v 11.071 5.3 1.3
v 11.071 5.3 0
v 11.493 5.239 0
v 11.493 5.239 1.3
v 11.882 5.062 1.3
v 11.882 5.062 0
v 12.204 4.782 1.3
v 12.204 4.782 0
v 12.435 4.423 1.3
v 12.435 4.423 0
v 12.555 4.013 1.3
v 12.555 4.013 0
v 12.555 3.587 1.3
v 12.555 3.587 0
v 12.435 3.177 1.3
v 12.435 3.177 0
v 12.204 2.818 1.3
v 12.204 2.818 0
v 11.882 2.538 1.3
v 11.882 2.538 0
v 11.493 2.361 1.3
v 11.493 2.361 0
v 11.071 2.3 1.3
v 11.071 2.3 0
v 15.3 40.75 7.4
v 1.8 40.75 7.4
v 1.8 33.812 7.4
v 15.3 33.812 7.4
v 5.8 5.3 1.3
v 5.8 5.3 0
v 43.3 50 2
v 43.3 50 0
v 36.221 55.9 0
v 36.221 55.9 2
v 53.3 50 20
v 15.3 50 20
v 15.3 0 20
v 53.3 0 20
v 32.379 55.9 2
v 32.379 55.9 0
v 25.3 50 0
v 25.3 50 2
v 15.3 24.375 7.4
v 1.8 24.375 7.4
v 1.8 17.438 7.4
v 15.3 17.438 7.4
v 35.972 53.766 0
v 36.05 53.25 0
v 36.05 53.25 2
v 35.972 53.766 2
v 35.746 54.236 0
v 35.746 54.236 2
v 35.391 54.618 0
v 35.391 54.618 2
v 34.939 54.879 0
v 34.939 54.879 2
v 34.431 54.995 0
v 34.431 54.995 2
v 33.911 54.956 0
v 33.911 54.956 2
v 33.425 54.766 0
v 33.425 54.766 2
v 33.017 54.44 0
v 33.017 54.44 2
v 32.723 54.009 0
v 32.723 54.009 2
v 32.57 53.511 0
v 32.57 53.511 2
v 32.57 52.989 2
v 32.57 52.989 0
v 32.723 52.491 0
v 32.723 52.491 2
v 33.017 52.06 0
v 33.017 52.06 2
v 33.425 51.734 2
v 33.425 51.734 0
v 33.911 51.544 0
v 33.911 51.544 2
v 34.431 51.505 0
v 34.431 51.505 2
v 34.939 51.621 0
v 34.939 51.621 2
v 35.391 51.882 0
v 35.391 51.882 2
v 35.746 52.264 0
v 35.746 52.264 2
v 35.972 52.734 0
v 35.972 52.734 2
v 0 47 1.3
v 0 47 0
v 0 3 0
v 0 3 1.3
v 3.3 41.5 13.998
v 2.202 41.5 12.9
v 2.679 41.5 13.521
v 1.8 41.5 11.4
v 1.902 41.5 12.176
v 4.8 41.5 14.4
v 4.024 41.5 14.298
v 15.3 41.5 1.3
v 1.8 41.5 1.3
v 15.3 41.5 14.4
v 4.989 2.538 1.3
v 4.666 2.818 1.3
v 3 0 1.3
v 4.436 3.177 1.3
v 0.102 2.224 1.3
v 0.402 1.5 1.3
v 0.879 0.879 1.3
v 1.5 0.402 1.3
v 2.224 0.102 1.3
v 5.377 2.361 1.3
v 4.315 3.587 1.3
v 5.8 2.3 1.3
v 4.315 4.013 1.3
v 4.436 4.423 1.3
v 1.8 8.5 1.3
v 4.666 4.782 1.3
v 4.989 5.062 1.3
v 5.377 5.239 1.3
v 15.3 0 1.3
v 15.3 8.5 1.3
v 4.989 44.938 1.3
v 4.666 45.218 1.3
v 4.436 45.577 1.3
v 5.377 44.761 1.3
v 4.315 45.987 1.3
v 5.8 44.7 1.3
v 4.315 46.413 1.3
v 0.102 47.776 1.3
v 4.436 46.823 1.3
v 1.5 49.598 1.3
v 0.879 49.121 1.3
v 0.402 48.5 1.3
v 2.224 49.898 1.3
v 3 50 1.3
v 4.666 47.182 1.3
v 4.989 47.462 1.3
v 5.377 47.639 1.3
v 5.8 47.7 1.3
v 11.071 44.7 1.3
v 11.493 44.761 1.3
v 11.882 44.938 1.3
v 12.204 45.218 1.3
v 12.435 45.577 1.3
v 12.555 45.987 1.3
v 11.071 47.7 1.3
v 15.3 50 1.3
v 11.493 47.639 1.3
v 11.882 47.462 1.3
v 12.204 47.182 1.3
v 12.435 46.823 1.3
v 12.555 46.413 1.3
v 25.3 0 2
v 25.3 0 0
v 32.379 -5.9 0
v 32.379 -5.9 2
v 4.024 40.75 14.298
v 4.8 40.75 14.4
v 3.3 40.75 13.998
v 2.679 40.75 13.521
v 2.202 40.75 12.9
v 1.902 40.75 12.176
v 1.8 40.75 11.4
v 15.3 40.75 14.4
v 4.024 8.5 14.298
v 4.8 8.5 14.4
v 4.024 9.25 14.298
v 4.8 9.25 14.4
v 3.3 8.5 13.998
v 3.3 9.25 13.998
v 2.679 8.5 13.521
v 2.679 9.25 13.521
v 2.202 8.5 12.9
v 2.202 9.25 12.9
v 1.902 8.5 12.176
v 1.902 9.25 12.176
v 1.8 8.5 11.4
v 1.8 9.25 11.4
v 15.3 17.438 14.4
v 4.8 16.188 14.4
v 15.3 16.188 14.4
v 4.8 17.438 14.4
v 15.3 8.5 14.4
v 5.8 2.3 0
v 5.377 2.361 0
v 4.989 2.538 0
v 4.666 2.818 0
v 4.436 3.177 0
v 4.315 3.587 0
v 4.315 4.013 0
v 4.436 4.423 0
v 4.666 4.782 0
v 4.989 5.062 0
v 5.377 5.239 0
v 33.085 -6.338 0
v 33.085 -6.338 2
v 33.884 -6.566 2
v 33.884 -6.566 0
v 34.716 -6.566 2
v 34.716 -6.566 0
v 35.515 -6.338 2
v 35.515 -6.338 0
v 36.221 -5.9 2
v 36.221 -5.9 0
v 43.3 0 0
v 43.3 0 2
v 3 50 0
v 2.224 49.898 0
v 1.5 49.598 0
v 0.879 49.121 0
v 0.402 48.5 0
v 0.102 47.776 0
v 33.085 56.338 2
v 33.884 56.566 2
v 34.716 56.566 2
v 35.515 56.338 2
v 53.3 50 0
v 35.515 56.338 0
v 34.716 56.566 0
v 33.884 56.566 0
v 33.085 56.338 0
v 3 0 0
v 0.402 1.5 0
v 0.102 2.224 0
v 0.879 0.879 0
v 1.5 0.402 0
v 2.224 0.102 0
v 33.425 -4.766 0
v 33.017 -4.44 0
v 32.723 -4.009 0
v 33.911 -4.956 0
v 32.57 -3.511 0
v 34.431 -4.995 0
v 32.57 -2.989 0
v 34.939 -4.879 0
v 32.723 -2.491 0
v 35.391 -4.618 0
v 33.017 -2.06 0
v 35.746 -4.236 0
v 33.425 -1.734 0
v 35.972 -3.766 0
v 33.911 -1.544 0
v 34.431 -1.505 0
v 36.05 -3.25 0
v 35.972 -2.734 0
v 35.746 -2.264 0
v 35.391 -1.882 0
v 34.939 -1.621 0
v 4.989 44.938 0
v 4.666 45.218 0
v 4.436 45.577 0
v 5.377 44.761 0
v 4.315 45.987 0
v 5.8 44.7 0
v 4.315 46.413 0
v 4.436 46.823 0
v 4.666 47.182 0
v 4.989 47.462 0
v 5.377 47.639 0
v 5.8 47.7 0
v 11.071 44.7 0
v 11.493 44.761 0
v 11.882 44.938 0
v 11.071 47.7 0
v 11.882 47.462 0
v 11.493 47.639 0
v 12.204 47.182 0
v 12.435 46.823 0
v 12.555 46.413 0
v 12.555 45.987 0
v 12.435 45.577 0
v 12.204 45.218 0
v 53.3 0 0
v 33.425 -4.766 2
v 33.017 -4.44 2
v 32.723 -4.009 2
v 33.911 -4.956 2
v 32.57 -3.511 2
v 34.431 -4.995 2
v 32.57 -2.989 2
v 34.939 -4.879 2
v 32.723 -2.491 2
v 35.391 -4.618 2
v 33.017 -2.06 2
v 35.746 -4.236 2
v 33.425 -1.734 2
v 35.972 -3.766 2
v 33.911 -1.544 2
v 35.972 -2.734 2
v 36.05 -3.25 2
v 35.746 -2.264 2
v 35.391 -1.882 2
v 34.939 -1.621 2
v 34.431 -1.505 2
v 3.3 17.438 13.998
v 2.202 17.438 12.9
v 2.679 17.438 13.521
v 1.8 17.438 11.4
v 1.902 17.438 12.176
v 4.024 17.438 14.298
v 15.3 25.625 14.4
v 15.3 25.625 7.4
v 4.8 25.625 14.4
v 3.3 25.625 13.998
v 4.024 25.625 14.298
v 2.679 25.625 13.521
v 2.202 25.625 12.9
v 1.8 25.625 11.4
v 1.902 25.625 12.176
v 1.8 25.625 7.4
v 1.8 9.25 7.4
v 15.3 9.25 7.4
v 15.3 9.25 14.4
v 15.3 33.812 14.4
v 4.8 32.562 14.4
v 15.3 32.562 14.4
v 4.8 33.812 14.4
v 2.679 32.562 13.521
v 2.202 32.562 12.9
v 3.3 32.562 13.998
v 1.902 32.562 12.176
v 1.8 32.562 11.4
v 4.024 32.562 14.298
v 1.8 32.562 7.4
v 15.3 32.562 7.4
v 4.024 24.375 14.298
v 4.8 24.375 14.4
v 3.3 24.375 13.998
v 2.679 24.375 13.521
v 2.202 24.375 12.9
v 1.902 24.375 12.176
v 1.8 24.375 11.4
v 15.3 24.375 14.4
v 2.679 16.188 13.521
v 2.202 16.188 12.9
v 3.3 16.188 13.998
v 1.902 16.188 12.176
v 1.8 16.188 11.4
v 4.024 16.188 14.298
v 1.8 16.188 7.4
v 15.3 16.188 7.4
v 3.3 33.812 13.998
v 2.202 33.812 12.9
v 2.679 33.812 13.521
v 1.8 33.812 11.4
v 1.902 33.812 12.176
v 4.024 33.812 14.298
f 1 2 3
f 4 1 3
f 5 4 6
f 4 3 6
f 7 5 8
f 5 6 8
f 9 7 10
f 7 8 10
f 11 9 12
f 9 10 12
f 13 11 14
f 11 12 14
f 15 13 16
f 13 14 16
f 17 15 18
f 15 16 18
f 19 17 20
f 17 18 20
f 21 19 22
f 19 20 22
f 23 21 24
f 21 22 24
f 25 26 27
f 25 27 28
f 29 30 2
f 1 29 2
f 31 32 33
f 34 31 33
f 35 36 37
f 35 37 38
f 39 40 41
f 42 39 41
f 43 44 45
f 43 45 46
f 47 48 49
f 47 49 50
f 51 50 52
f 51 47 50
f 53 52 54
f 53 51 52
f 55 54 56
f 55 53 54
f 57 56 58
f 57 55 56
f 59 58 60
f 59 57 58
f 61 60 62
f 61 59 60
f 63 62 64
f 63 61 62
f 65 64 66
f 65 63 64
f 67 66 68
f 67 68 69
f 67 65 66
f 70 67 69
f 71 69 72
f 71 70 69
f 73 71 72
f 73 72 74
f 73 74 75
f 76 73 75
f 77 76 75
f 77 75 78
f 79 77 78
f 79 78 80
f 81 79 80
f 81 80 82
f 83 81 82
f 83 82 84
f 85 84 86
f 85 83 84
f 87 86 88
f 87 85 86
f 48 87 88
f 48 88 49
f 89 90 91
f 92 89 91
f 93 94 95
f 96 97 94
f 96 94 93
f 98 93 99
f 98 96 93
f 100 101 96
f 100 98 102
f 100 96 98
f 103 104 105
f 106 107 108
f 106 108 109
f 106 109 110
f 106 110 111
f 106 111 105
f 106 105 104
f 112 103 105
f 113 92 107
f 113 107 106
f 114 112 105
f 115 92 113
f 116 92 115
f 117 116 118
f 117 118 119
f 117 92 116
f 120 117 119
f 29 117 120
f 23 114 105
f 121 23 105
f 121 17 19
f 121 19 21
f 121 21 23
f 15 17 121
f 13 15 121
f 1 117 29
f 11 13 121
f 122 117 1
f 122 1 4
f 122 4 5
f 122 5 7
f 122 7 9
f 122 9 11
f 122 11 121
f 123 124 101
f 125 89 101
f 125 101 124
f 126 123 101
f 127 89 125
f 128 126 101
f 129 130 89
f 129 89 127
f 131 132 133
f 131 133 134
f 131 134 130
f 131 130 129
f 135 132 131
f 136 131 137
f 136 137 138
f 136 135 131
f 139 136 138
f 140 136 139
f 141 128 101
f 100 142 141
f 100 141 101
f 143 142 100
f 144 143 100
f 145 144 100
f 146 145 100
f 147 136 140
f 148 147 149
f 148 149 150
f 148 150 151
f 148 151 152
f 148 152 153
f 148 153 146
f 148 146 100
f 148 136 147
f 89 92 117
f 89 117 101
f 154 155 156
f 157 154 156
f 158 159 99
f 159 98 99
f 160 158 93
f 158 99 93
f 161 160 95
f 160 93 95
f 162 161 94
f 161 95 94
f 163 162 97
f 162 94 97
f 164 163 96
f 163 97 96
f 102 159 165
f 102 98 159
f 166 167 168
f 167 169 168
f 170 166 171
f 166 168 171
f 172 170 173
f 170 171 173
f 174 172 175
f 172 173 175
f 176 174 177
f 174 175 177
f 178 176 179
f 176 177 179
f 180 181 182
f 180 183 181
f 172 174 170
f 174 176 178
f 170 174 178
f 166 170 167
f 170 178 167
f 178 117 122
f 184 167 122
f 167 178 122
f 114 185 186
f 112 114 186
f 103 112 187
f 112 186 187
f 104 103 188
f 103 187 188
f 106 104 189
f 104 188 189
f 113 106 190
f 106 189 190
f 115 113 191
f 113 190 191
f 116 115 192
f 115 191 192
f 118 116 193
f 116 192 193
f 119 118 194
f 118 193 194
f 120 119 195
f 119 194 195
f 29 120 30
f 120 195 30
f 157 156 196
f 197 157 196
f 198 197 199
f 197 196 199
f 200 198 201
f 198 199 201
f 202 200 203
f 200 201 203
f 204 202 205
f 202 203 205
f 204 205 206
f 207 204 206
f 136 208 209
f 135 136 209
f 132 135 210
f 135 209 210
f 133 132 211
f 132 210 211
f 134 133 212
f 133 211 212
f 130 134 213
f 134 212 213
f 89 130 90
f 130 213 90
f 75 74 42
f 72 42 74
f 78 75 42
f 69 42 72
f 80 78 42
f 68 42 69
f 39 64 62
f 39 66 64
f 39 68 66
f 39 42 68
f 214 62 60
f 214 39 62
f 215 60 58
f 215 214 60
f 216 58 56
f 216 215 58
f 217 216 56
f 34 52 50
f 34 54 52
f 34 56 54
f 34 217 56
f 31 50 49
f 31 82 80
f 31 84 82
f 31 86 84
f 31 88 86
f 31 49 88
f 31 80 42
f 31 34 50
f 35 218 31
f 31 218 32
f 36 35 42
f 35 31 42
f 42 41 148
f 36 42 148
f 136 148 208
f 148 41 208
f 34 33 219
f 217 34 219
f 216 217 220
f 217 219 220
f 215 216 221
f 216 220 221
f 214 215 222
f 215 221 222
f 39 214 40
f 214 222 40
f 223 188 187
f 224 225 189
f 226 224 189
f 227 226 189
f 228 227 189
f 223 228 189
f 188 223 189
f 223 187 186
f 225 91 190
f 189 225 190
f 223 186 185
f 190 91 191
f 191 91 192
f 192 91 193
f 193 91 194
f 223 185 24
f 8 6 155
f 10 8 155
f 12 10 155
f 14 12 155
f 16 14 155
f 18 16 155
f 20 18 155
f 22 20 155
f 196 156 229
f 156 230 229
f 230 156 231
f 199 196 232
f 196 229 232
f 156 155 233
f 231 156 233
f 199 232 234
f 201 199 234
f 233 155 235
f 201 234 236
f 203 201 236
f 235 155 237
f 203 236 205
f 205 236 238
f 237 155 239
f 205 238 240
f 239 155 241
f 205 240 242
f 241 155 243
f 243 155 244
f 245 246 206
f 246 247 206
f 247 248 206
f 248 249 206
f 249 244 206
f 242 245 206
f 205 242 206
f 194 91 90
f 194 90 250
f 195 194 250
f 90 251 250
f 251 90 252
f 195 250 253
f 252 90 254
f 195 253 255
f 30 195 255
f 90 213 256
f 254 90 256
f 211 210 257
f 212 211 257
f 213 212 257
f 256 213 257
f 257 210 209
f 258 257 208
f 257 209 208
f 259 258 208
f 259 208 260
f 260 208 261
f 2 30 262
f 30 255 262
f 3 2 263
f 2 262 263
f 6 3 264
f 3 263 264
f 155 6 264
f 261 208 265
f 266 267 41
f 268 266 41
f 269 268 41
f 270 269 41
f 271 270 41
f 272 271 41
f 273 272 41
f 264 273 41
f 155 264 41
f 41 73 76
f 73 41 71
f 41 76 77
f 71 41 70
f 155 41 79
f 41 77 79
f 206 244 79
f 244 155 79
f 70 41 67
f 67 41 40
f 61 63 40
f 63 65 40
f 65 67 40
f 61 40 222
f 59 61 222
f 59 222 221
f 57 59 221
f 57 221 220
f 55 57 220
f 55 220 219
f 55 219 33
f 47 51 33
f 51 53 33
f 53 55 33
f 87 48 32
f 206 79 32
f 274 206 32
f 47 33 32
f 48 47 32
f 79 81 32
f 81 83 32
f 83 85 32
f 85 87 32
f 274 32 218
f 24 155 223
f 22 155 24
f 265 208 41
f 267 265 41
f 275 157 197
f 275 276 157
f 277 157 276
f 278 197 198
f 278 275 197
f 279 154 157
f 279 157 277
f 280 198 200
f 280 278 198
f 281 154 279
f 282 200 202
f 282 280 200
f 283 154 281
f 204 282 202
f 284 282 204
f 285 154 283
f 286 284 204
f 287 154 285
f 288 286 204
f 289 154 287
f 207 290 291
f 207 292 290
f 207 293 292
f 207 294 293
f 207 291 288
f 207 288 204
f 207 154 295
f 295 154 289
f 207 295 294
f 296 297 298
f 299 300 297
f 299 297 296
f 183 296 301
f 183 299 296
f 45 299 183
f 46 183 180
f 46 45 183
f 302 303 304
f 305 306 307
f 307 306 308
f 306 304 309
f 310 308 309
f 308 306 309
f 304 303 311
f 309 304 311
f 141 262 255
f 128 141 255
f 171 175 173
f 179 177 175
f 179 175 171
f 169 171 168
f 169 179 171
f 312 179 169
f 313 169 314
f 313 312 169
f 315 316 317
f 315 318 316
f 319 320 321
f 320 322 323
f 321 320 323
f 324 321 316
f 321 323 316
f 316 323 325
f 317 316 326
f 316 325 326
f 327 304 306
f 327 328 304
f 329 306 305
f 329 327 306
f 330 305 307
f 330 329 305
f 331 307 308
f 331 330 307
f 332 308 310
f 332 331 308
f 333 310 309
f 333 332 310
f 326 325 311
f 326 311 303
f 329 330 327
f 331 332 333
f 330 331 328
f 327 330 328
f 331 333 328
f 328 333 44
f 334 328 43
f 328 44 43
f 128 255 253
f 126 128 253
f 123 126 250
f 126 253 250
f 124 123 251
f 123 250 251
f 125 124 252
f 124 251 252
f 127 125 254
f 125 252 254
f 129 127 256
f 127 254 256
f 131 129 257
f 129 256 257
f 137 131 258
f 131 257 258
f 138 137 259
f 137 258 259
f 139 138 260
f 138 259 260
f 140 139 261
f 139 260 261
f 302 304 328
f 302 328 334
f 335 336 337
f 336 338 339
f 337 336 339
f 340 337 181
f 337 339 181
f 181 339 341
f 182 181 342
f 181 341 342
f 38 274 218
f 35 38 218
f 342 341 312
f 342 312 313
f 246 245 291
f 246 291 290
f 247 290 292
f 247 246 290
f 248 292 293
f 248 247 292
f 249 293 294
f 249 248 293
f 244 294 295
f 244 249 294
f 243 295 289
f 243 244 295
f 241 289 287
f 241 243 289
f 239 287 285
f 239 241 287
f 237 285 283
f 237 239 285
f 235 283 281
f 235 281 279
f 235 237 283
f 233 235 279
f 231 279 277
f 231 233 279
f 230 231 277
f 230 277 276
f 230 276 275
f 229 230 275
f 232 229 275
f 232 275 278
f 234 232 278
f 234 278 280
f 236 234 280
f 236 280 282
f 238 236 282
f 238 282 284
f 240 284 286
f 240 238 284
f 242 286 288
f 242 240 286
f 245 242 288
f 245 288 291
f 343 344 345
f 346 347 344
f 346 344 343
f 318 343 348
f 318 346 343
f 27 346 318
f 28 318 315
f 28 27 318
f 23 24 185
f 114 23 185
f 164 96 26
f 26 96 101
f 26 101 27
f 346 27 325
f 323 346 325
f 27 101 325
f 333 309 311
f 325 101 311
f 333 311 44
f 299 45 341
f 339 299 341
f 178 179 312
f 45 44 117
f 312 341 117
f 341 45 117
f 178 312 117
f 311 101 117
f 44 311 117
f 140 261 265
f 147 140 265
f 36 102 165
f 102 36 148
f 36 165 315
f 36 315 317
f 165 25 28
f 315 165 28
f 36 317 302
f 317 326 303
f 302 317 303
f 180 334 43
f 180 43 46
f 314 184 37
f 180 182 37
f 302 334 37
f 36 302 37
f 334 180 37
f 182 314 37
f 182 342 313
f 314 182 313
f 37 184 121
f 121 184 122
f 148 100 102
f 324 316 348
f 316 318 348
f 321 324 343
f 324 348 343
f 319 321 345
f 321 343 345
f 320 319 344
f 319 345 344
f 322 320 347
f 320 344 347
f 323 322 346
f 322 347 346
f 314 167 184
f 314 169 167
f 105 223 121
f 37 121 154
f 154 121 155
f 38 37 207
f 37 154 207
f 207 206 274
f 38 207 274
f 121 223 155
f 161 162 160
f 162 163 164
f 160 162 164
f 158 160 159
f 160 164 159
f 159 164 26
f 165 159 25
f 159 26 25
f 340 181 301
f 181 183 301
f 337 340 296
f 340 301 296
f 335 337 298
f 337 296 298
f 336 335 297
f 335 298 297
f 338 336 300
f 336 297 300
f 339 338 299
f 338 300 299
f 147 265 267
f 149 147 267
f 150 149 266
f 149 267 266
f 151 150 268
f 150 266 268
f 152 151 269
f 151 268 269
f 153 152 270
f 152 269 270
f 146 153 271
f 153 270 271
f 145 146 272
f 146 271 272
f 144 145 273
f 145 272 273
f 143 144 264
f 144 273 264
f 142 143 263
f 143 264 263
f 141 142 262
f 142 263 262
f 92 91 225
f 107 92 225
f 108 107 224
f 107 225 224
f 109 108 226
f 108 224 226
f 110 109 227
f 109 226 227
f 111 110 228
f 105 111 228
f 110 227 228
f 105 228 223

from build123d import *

# Parameters (mm, degrees)
F1_DEPTH = 20
F0_R     = 1.75
F2_DEPTH = 2
F3_DEPTH = 1.3
F4_W     = 13.5
F4_H     = 6.9375
F4_H_2   = 1.25
F4_H_3   = 0.75
F5_DEPTH = 6.1
F6_DEPTH = 13.1
F7_R     = 3


with BuildPart() as f1:
    # F0 (on Top) → F1 (new body)
    with BuildSketch(Plane.XY):
        Polygon((15.3, 50), (15.3, 0), (25.3, 0), (43.3, 0), (53.3, 0), (53.3, 50), (43.3, 50), (25.3, 50), align=None)
    extrude(amount=F1_DEPTH)

    # F0 (on Top) → F2 (join)
    with BuildSketch(Plane.XY):
        with BuildLine():
            Line((43.3, 0), (25.3, 0))
            Line((25.3, 0), (32.379446801, -5.8995390008))
            ThreePointArc((32.379446801, -5.8995390008), (34.3, -6.594875162), (36.220553199, -5.8995390008))
            Line((36.220553199, -5.8995390008), (43.3, 0))
        make_face()
        with Locations((34.3, -3.25)):
            Circle(F0_R, mode=Mode.SUBTRACT)
        with BuildLine():
            Line((32.379446801, 55.8995390008), (25.3, 50))
            Line((25.3, 50), (43.3, 50))
            Line((43.3, 50), (36.220553199, 55.8995390008))
            ThreePointArc((36.220553199, 55.8995390008), (34.3, 56.594875162), (32.379446801, 55.8995390008))
        make_face()
        with Locations((34.3, 53.25)):
            Circle(F0_R, mode=Mode.SUBTRACT)
    extrude(amount=F2_DEPTH)

    # F0 (on Top) → F3 (join)
    with BuildSketch(Plane.XY):
        with BuildLine():
            ThreePointArc((0, 3), (0.8786796564, 0.8786796564), (3, 0))
            Line((3, 0), (15.3, 0))
            Line((15.3, 0), (15.3, 50))
            Line((15.3, 50), (3, 50))
            ThreePointArc((3, 50), (0.8786796564, 49.1213203436), (0, 47))
            Line((0, 47), (0, 3))
        make_face()
        with BuildLine():
            Line((11.0706789419, 2.3), (5.8, 2.3))
            ThreePointArc((5.8, 2.3), (4.3, 3.8), (5.8, 5.3))
            Line((5.8, 5.3), (11.0706789419, 5.3))
            ThreePointArc((11.0706789419, 5.3), (12.5706789419, 3.8), (11.0706789419, 2.3))
        make_face(mode=Mode.SUBTRACT)
        with BuildLine():
            Line((11.0706789419, 44.7), (5.8, 44.7))
            ThreePointArc((5.8, 44.7), (4.3, 46.2), (5.8, 47.7))
            Line((5.8, 47.7), (11.0706789419, 47.7))
            ThreePointArc((11.0706789419, 47.7), (12.5706789419, 46.2), (11.0706789419, 44.7))
        make_face(mode=Mode.SUBTRACT)
    extrude(amount=F3_DEPTH)

    # F4 (on face) → F5 (join)
    with BuildSketch(Plane.XY.offset(1.3)):
        with Locations((8.55, 37.28125)):
            Rectangle(F4_W, F4_H)
        with Locations((8.55, 33.1875)):
            Rectangle(F4_W, F4_H_2)
        with Locations((8.55, 29.09375)):
            Rectangle(F4_W, F4_H)
        Polygon((15.3, 25), (15.3, 25.625), (1.8, 25.625), (1.8, 25), (1.8, 24.375), (15.3, 24.375), align=None)
        with Locations((8.55, 20.90625)):
            Rectangle(F4_W, F4_H)
        with Locations((8.55, 16.8125)):
            Rectangle(F4_W, F4_H_2)
        with Locations((8.55, 12.71875)):
            Rectangle(F4_W, F4_H)
        with Locations((8.55, 8.875)):
            Rectangle(F4_W, F4_H_3)
        with Locations((8.55, 41.125)):
            Rectangle(F4_W, F4_H_3)
    extrude(amount=F5_DEPTH)

    # F4 (on face) → F6 (join)
    with BuildSketch(Plane.XY.offset(1.3)):
        with Locations((8.55, 41.125)):
            Rectangle(F4_W, F4_H_3)
        with Locations((8.55, 8.875)):
            Rectangle(F4_W, F4_H_3)
        with Locations((8.55, 33.1875)):
            Rectangle(F4_W, F4_H_2)
        Polygon((15.3, 25), (15.3, 25.625), (1.8, 25.625), (1.8, 25), (1.8, 24.375), (15.3, 24.375), align=None)
        with Locations((8.55, 16.8125)):
            Rectangle(F4_W, F4_H_2)
    extrude(amount=F6_DEPTH)

    # F7
    f7_edges = [f1.edges().sort_by_distance(p)[0] for p in [
        (1.8, 41.125, 14.4),
        (1.8, 33.1875, 14.4),
        (1.8, 8.875, 14.4),
        (1.8, 25, 14.4),
        (1.8, 16.8125, 14.4),
    ]]
    fillet(f7_edges, radius=F7_R)


solid = f1.part
